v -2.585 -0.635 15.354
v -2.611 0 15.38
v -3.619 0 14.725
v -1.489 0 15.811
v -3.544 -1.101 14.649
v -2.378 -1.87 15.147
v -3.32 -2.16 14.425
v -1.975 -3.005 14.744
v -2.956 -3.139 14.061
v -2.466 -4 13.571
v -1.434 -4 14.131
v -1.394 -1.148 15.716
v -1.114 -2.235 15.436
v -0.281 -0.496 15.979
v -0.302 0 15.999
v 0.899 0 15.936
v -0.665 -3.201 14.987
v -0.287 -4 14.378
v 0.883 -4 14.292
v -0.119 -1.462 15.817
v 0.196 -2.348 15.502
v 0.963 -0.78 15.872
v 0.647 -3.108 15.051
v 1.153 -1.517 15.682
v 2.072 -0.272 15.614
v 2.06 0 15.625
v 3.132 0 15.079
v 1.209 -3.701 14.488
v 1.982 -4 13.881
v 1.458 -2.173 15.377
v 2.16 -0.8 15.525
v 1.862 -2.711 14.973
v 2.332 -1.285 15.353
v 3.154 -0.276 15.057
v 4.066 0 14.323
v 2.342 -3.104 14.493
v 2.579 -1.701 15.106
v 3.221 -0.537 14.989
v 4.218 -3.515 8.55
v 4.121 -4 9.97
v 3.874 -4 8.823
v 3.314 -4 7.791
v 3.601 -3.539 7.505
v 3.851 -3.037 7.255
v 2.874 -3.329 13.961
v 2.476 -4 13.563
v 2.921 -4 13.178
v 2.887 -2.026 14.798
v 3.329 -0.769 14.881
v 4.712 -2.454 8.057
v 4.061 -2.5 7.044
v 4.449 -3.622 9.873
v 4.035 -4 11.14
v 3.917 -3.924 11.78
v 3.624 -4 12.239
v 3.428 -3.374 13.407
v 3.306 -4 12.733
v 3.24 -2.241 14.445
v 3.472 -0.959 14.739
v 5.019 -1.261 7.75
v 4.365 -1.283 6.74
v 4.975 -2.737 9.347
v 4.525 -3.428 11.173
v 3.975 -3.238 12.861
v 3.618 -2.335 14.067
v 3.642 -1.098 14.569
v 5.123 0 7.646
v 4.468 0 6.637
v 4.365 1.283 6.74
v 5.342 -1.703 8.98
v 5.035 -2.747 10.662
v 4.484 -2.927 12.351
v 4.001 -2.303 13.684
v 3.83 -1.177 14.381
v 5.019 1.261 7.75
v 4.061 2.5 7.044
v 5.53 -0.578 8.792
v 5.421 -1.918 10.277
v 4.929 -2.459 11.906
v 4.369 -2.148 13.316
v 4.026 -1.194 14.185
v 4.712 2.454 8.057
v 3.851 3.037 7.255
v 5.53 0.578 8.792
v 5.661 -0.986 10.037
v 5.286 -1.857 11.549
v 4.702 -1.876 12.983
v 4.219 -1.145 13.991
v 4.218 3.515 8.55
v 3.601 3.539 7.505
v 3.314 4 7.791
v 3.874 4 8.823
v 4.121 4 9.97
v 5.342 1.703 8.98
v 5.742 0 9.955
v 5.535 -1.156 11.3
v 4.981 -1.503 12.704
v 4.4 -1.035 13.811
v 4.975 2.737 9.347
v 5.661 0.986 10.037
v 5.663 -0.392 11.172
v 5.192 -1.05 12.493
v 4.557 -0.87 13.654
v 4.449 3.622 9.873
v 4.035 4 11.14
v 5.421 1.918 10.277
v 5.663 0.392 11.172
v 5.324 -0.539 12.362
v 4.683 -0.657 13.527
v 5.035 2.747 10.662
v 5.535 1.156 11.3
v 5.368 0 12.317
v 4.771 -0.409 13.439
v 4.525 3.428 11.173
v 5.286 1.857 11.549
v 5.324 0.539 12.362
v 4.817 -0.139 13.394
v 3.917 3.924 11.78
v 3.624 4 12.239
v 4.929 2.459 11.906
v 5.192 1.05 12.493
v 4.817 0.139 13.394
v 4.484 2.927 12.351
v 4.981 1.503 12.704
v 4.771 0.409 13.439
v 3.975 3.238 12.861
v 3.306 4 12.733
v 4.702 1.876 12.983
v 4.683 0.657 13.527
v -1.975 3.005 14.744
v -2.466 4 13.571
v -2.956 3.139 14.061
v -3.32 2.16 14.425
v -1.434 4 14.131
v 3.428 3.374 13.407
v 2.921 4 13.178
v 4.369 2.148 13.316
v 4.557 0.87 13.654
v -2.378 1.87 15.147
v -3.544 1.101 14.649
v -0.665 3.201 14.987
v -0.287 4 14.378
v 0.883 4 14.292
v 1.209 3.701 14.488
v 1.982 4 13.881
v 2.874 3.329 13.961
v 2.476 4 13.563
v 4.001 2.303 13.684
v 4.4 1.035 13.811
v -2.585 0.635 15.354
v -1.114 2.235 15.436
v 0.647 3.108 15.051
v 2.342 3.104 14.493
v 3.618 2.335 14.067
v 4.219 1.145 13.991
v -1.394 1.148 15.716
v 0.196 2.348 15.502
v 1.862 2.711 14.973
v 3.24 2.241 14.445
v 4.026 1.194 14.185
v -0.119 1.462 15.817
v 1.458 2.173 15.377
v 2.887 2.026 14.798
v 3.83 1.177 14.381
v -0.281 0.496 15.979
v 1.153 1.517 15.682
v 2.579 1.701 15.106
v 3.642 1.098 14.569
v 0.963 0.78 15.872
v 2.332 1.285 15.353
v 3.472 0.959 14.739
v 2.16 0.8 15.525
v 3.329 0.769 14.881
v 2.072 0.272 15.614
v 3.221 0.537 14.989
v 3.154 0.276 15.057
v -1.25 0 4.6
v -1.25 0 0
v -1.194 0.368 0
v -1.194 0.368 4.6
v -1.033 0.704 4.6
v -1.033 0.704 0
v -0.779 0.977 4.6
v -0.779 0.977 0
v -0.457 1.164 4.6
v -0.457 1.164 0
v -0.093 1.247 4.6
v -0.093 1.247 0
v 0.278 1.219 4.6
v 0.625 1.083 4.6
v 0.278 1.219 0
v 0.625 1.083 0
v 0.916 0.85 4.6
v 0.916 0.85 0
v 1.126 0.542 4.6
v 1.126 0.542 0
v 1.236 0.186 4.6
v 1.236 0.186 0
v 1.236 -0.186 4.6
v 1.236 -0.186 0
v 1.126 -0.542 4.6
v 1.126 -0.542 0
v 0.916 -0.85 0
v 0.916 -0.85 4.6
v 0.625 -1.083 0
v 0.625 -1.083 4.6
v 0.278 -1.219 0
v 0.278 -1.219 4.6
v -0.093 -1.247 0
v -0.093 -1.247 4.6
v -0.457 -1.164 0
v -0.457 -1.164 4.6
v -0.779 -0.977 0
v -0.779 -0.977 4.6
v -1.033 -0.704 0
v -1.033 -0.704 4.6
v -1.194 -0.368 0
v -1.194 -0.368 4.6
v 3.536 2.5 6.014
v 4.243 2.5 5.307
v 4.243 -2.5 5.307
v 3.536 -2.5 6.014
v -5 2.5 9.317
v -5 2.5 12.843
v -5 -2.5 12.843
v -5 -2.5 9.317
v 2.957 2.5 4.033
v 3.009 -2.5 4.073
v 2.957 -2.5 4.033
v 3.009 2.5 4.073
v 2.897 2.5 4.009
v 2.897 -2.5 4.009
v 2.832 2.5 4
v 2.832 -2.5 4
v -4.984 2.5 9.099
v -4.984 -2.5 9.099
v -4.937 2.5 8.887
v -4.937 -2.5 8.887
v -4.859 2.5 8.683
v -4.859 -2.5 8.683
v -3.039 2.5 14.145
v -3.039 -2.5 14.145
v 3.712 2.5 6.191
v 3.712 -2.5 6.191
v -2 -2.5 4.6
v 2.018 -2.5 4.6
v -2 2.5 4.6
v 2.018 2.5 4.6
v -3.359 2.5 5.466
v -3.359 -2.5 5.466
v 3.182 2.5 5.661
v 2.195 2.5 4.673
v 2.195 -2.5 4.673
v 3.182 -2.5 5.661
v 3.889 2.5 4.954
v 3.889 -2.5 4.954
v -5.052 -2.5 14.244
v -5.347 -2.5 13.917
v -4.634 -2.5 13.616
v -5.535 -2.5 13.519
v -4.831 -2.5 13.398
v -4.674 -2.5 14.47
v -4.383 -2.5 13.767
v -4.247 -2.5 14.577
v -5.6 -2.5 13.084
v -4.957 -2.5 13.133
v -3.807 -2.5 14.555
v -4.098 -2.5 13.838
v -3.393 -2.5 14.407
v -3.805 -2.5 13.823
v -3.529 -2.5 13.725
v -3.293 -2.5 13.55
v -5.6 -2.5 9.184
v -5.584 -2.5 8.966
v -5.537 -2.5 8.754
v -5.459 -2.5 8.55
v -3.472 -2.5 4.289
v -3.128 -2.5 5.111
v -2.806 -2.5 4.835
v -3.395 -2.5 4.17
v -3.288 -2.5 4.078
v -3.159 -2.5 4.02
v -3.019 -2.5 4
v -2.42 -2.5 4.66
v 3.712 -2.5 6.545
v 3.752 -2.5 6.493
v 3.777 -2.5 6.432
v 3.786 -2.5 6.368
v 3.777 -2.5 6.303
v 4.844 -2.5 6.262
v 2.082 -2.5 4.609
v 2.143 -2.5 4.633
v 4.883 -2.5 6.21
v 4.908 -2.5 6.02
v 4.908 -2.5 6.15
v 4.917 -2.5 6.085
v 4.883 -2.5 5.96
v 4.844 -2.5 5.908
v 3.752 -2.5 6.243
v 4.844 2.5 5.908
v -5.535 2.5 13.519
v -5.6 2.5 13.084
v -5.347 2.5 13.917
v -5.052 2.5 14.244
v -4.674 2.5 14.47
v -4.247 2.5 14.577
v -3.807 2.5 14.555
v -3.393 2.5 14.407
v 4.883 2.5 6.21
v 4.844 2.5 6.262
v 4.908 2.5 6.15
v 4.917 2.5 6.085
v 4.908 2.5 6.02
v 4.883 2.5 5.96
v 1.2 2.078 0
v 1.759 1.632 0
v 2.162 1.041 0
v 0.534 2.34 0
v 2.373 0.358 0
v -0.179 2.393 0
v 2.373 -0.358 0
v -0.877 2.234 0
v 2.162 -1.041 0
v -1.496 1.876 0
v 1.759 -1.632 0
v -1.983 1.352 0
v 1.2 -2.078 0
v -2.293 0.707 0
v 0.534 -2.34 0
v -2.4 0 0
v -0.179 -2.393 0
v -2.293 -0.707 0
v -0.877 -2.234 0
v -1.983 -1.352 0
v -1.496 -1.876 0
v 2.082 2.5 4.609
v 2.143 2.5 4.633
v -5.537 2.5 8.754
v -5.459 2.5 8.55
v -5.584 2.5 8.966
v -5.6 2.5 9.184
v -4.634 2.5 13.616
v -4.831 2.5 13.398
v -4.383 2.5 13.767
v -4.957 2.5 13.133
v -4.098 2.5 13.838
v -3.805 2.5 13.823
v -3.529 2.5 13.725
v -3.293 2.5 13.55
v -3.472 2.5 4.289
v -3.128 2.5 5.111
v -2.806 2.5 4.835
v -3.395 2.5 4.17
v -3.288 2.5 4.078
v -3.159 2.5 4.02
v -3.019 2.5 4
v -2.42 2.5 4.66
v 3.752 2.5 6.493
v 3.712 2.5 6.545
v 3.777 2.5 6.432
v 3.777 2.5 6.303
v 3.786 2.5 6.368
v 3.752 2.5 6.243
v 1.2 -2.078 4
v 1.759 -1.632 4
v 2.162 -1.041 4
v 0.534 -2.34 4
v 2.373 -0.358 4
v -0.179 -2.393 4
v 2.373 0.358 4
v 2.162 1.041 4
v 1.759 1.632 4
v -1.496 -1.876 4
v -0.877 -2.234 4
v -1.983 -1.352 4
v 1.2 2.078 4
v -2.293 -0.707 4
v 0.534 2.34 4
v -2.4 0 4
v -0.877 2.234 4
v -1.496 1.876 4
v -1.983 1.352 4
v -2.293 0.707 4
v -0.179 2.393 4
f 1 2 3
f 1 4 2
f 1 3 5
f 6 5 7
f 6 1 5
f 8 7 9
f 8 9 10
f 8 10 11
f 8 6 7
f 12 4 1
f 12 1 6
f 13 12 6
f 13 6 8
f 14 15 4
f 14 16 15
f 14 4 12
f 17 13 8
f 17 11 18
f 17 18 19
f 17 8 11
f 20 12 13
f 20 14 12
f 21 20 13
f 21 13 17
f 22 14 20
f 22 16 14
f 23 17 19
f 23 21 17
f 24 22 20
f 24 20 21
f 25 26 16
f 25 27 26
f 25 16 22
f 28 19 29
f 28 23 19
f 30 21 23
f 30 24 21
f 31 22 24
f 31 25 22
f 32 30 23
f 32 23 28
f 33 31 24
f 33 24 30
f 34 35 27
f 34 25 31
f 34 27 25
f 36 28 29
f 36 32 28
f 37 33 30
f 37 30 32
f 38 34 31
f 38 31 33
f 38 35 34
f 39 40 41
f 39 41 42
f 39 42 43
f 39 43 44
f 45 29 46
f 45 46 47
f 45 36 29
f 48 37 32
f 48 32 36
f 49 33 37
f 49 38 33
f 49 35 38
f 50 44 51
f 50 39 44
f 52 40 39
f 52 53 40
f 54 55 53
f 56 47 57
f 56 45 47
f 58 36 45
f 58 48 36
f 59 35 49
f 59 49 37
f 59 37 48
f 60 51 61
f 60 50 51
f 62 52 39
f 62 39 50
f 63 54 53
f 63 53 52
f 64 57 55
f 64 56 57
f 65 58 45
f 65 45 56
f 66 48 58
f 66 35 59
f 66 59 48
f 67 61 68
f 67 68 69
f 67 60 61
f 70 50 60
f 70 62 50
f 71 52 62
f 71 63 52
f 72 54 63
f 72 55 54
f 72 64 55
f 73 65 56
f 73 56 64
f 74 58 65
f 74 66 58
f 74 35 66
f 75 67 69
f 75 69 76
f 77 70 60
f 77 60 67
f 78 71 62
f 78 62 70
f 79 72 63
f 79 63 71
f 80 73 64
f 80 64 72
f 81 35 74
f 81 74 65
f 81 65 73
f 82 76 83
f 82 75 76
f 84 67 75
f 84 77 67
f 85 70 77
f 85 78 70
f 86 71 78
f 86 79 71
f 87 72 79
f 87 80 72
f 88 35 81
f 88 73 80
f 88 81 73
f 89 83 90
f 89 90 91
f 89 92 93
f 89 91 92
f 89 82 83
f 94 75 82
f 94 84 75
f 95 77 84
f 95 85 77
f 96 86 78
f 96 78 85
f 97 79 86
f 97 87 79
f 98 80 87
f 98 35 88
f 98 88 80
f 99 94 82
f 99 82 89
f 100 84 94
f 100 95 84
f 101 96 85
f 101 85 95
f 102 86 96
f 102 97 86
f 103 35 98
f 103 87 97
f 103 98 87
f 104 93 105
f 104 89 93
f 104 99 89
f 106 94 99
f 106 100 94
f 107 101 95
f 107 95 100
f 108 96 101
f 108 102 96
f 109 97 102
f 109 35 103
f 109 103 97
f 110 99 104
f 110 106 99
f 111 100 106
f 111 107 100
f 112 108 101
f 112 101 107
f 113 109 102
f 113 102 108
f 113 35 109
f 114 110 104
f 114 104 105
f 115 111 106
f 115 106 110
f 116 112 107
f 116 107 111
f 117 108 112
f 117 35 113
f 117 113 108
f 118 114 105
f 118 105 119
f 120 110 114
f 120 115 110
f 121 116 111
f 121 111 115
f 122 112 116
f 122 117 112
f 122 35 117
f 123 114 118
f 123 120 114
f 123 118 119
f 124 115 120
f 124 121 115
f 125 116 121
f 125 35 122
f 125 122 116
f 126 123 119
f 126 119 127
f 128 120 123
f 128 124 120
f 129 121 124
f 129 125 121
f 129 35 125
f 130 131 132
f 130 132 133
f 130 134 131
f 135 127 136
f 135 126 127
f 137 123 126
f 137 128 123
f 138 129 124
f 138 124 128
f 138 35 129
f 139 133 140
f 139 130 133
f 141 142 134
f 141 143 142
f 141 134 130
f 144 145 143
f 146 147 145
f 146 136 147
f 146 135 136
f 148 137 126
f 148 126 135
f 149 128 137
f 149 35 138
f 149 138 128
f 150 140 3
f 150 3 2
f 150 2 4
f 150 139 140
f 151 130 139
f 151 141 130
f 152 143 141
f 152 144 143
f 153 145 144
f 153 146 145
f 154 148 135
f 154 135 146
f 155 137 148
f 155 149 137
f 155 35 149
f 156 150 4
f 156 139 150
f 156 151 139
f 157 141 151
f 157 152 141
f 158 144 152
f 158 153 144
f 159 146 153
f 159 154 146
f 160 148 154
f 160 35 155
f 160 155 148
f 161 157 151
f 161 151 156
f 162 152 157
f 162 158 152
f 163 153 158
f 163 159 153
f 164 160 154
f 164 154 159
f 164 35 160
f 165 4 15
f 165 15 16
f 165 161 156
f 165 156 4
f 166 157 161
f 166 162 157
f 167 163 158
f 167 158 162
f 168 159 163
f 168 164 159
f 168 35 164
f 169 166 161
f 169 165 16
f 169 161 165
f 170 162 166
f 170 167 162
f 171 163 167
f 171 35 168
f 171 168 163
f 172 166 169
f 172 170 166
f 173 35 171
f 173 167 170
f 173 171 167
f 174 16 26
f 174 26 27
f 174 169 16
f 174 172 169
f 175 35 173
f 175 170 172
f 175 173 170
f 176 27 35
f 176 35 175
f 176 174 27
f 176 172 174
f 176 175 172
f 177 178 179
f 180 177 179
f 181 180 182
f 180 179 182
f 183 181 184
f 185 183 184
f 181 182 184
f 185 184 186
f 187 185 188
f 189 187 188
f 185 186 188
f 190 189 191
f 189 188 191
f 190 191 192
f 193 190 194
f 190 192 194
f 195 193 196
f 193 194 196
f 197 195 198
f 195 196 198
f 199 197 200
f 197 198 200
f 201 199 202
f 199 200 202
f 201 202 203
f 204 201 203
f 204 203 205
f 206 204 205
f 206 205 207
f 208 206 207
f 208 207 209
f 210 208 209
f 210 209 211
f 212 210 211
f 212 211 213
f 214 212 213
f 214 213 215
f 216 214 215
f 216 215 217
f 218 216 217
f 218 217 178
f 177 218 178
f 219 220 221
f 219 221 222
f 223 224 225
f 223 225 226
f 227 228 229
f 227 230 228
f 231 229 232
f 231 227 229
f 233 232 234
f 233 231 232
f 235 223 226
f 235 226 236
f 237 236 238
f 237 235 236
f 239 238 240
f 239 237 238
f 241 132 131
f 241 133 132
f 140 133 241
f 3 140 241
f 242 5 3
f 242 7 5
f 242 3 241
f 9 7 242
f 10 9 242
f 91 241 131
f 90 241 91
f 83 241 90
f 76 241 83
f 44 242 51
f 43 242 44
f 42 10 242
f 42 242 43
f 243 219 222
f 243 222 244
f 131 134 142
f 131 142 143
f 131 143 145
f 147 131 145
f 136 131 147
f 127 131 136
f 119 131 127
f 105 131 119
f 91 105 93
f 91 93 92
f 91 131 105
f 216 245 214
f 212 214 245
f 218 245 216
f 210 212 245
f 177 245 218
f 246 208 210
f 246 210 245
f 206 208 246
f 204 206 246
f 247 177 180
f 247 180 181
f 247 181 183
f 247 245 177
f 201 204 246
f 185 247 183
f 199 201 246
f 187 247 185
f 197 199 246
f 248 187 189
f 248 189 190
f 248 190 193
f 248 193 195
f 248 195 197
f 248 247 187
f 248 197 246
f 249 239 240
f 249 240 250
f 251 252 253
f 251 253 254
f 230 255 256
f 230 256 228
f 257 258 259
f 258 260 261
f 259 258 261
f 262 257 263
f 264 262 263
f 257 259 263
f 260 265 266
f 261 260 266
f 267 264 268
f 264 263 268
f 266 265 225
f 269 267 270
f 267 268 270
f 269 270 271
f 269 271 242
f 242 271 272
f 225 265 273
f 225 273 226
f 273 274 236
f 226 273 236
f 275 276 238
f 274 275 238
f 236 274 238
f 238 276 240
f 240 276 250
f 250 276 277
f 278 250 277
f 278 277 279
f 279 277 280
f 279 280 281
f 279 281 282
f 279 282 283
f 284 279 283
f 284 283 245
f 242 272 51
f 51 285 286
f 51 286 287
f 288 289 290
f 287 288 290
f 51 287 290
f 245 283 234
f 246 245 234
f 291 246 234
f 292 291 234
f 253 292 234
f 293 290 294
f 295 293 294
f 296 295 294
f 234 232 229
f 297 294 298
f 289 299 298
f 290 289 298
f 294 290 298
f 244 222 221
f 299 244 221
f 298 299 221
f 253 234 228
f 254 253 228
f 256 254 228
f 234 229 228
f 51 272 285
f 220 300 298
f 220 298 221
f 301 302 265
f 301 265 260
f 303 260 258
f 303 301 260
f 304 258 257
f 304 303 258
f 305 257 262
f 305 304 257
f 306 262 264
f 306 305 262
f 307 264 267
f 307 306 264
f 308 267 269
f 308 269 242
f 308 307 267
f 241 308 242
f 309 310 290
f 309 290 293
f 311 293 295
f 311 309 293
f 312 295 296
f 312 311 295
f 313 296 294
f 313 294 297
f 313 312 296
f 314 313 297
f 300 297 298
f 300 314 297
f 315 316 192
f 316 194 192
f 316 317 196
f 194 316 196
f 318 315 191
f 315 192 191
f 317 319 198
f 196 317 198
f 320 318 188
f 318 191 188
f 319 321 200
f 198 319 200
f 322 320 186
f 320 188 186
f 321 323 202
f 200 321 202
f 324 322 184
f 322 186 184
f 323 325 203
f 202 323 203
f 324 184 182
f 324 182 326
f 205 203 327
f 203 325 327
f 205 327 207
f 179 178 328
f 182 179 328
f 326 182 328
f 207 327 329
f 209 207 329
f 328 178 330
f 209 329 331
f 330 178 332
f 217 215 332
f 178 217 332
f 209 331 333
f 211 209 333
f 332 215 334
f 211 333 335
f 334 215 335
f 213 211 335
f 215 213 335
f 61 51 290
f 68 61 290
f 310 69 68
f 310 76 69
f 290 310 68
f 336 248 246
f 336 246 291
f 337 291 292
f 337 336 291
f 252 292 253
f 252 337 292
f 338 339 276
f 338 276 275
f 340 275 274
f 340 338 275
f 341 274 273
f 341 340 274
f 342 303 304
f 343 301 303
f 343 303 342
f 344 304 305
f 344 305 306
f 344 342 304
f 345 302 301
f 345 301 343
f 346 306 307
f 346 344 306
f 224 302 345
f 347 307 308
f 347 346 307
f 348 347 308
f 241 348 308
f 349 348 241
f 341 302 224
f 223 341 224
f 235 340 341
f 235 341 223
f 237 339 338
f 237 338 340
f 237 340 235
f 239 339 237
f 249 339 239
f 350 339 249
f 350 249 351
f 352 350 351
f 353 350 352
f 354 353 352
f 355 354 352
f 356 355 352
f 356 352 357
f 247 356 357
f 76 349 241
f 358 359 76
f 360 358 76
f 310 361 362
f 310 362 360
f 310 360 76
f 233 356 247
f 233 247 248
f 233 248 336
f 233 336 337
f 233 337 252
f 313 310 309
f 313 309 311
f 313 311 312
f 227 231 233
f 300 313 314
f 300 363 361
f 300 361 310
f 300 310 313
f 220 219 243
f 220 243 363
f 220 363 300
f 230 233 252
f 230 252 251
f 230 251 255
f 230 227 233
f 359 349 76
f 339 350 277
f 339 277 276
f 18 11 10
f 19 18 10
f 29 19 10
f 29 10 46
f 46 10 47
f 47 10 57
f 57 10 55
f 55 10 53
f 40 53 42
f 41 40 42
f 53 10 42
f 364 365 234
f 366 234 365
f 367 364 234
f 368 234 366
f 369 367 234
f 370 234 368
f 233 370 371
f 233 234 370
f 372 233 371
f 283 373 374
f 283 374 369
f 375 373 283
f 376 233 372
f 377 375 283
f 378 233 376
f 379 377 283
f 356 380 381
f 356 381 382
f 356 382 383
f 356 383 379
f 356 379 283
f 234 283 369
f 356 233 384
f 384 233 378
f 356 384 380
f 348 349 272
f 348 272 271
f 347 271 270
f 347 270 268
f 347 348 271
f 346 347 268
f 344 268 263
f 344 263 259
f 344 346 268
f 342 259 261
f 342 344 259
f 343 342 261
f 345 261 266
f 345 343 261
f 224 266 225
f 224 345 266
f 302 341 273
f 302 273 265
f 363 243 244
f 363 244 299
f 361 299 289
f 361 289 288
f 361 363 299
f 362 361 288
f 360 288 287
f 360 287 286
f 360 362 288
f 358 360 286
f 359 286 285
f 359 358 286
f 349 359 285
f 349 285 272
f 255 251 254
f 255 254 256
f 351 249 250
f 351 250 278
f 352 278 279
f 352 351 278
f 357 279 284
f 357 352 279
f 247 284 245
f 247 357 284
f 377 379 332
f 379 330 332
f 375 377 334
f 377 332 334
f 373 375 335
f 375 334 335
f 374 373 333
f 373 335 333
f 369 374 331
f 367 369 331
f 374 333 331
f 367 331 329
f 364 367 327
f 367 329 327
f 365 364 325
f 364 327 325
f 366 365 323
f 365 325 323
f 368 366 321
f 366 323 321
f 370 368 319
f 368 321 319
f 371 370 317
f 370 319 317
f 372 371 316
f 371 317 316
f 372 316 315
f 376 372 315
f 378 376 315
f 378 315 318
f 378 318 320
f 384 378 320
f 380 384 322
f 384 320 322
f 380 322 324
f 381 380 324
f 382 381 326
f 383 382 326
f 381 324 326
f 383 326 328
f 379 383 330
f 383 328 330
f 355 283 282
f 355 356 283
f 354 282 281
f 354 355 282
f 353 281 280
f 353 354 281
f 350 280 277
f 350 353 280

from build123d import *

# Parameters (mm, degrees)
SKETCH16_W           = 2.4
SKETCH16_H           = 4
BOSS_EXTRUDE11_DEPTH = 2.5
SKETCH19_R           = 1.25
CUT_EXTRUDE12_DEPTH  = 5
CUT_EXTRUDE13_DEPTH  = 10


with BuildPart() as part:
    # Sketch16 → Revolve1 (revolve)
    with BuildSketch(Plane(origin=(0, 0, 0), x_dir=(1, 0, 0), z_dir=(0, 1, 0))):
        with Locations((-1.2, -2)):
            Rectangle(SKETCH16_W, SKETCH16_H)
    revolve(axis=Axis((0, 0, -4.094545455), (0, 0, 1)))

    # Sketch18 → Boss-Extrude11 (add, symmetric)
    with BuildSketch(Plane(origin=(0, 0, 0), x_dir=(1, 0, 0), z_dir=(0, 1, 0))):
        with BuildLine():
            Line((0, -4), (-3.019312417, -4))
            ThreePointArc((-3.019312417, -4), (-3.287962221, -4.078304277), (-3.472466311, -4.288690869))
            Line((-3.472466311, -4.288690869), (-5.459461681, -8.549816191))
            ThreePointArc((-5.459461681, -8.549816191), (-5.564444011, -8.859084162), (-5.6, -9.183743583))
            Line((-5.6, -9.183743583), (-5.6, -13.084062043))
            ThreePointArc((-5.6, -13.084062043), (-4.674025149, -14.469881342), (-3.039339828, -14.144722215))
            Line((-3.039339828, -14.144722215), (4.843681451, -6.261700936))
            ThreePointArc((4.843681451, -6.261700936), (4.916904756, -6.08492424), (4.843681451, -5.908147545))
            Line((4.843681451, -5.908147545), (4.242640687, -5.307106781))
            Line((4.242640687, -5.307106781), (3.535533906, -6.014213562))
            Line((3.535533906, -6.014213562), (3.712310601, -6.190990258))
            ThreePointArc((3.712310601, -6.190990258), (3.785533906, -6.367766953), (3.712310601, -6.544543648))
            Line((3.712310601, -6.544543648), (-3.292893219, -13.549747468))
            ThreePointArc((-3.292893219, -13.549747468), (-4.382683432, -13.76652022), (-5, -12.842640687))
            Line((-5, -12.842640687), (-5, -9.316760381))
            ThreePointArc((-5, -9.316760381), (-4.964444011, -8.99210096), (-4.859461681, -8.682832988))
            Line((-4.859461681, -8.682832988), (-3.359461681, -5.466072607))
            ThreePointArc((-3.359461681, -5.466072607), (-2.805949413, -4.834912831), (-2, -4.6))
            Line((-2, -4.6), (0, -4.6))
            Line((0, -4.6), (2.017766953, -4.6))
            ThreePointArc((2.017766953, -4.6), (2.113437811, -4.619030117), (2.194543648, -4.673223305))
            Line((2.194543648, -4.673223305), (3.181980515, -5.660660172))
            Line((3.181980515, -5.660660172), (3.889087297, -4.953553391))
            Line((3.889087297, -4.953553391), (3.008757211, -4.073223305))
            ThreePointArc((3.008757211, -4.073223305), (2.927651373, -4.019030117), (2.831980515, -4))
            Line((2.831980515, -4), (0, -4))
        make_face()
    extrude(amount=BOSS_EXTRUDE11_DEPTH, both=True)

    # Sketch19 → Cut-Extrude12 (cut)
    with BuildSketch(Plane(origin=(0, 0, 0), x_dir=(-1, 0, 0), z_dir=(0, 0, -1))):
        Circle(SKETCH19_R)
    extrude(amount=-CUT_EXTRUDE12_DEPTH, mode=Mode.SUBTRACT)

    # Sketch22 → Revolve2 (revolve)
    with BuildSketch(Plane.XZ):
        with BuildLine():
            Line((0.424264069, 10.681118318), (-3.619403821, 14.724786208))
            ThreePointArc((-3.619403821, 14.724786208), (0.300410275, 15.99900138), (4.065863992, 14.322718241))
            Line((4.065863992, 14.322718241), (0.424264069, 10.681118318))
        make_face()
    revolve(axis=Axis((0, 0, 10.256854249), (0.7071067811865477, 0, 0.7071067811865474)))

    # Sketch23 → Cut-Extrude13 (cut)
    with BuildSketch(Plane(origin=(5.552691193, 0, 5.552691193), x_dir=(-0.7071067811865476, 0, 0.7071067811865476), z_dir=(-0.7071067811865476, 0, -0.7071067811865476))):
        with BuildLine():
            Line((11.339560411, 4), (3.165821976, 4))
            ThreePointArc((3.165821976, 4), (7.252691193, 5.718609971), (11.339560411, 4))
        make_face()
        with BuildLine():
            Line((11.339560411, -4), (3.165821976, -4))
            ThreePointArc((3.165821976, -4), (7.252691193, -5.718609971), (11.339560411, -4))
        make_face()
    extrude(amount=-CUT_EXTRUDE13_DEPTH, mode=Mode.SUBTRACT)


solid = part.part
